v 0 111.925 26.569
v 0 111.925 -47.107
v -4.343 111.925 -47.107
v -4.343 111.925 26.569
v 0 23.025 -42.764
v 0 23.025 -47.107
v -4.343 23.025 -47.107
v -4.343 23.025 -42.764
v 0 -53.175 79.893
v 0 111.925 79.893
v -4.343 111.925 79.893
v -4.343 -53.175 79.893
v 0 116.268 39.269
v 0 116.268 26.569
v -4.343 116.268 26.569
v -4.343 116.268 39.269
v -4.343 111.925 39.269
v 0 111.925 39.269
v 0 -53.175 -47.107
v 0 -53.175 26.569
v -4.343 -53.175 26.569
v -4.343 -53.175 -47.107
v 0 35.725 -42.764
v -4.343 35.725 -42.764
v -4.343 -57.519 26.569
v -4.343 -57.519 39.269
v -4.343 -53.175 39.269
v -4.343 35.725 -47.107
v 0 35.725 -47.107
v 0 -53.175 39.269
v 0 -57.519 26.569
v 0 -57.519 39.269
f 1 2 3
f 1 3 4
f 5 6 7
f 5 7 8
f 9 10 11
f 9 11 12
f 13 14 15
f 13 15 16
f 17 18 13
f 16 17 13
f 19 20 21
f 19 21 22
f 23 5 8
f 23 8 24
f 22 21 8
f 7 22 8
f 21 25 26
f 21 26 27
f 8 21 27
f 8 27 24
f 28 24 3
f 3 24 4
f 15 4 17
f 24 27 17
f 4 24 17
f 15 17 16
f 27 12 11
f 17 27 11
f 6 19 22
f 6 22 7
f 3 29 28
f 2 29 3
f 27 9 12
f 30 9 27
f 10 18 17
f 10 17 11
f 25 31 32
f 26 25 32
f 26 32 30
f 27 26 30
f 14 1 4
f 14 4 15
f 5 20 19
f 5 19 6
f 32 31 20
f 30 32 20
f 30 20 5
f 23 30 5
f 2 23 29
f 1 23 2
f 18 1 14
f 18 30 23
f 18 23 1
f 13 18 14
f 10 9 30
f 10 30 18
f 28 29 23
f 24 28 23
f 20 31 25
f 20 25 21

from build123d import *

# Parameters (mm, degrees)
F0_W     = 4.3434
F0_H     = 12.7
F0_W_2   = 12.7
F0_H_2   = 4.3434
F1_DEPTH = 4.3434
F2_W     = 12.7
F2_H     = 4.3434
F3_DEPTH = 4.3444


with BuildPart() as f1:
    # F0 (on Right) → F1 (new body)
    with BuildSketch(Plane.YZ):
        Polygon((111.924825, 79.89284), (-53.175175, 79.89284), (-53.175175, 39.269085), (-53.175175, 26.569085), (-53.175175, -47.10716), (23.024825, -47.10716), (23.024825, -42.76376), (35.724825, -42.76376), (35.724825, -47.10716), (111.924825, -47.10716), (111.924825, 26.569085), (111.924825, 39.269085), align=None)
        with Locations((-55.346875, 32.919085)):
            Rectangle(F0_W, F0_H)
        with Locations((114.096525, 32.919085)):
            Rectangle(F0_W, F0_H)
        with Locations((29.374825, -44.93546)):
            Rectangle(F0_W_2, F0_H_2)
    extrude(amount=-F1_DEPTH)

    # F2 (on Right) → F3 (cut, through all)
    with BuildSketch(Plane.YZ):
        with Locations((29.374825, -44.93546)):
            Rectangle(F2_W, F2_H)
    extrude(amount=-F3_DEPTH, mode=Mode.SUBTRACT)


solid = f1.part
